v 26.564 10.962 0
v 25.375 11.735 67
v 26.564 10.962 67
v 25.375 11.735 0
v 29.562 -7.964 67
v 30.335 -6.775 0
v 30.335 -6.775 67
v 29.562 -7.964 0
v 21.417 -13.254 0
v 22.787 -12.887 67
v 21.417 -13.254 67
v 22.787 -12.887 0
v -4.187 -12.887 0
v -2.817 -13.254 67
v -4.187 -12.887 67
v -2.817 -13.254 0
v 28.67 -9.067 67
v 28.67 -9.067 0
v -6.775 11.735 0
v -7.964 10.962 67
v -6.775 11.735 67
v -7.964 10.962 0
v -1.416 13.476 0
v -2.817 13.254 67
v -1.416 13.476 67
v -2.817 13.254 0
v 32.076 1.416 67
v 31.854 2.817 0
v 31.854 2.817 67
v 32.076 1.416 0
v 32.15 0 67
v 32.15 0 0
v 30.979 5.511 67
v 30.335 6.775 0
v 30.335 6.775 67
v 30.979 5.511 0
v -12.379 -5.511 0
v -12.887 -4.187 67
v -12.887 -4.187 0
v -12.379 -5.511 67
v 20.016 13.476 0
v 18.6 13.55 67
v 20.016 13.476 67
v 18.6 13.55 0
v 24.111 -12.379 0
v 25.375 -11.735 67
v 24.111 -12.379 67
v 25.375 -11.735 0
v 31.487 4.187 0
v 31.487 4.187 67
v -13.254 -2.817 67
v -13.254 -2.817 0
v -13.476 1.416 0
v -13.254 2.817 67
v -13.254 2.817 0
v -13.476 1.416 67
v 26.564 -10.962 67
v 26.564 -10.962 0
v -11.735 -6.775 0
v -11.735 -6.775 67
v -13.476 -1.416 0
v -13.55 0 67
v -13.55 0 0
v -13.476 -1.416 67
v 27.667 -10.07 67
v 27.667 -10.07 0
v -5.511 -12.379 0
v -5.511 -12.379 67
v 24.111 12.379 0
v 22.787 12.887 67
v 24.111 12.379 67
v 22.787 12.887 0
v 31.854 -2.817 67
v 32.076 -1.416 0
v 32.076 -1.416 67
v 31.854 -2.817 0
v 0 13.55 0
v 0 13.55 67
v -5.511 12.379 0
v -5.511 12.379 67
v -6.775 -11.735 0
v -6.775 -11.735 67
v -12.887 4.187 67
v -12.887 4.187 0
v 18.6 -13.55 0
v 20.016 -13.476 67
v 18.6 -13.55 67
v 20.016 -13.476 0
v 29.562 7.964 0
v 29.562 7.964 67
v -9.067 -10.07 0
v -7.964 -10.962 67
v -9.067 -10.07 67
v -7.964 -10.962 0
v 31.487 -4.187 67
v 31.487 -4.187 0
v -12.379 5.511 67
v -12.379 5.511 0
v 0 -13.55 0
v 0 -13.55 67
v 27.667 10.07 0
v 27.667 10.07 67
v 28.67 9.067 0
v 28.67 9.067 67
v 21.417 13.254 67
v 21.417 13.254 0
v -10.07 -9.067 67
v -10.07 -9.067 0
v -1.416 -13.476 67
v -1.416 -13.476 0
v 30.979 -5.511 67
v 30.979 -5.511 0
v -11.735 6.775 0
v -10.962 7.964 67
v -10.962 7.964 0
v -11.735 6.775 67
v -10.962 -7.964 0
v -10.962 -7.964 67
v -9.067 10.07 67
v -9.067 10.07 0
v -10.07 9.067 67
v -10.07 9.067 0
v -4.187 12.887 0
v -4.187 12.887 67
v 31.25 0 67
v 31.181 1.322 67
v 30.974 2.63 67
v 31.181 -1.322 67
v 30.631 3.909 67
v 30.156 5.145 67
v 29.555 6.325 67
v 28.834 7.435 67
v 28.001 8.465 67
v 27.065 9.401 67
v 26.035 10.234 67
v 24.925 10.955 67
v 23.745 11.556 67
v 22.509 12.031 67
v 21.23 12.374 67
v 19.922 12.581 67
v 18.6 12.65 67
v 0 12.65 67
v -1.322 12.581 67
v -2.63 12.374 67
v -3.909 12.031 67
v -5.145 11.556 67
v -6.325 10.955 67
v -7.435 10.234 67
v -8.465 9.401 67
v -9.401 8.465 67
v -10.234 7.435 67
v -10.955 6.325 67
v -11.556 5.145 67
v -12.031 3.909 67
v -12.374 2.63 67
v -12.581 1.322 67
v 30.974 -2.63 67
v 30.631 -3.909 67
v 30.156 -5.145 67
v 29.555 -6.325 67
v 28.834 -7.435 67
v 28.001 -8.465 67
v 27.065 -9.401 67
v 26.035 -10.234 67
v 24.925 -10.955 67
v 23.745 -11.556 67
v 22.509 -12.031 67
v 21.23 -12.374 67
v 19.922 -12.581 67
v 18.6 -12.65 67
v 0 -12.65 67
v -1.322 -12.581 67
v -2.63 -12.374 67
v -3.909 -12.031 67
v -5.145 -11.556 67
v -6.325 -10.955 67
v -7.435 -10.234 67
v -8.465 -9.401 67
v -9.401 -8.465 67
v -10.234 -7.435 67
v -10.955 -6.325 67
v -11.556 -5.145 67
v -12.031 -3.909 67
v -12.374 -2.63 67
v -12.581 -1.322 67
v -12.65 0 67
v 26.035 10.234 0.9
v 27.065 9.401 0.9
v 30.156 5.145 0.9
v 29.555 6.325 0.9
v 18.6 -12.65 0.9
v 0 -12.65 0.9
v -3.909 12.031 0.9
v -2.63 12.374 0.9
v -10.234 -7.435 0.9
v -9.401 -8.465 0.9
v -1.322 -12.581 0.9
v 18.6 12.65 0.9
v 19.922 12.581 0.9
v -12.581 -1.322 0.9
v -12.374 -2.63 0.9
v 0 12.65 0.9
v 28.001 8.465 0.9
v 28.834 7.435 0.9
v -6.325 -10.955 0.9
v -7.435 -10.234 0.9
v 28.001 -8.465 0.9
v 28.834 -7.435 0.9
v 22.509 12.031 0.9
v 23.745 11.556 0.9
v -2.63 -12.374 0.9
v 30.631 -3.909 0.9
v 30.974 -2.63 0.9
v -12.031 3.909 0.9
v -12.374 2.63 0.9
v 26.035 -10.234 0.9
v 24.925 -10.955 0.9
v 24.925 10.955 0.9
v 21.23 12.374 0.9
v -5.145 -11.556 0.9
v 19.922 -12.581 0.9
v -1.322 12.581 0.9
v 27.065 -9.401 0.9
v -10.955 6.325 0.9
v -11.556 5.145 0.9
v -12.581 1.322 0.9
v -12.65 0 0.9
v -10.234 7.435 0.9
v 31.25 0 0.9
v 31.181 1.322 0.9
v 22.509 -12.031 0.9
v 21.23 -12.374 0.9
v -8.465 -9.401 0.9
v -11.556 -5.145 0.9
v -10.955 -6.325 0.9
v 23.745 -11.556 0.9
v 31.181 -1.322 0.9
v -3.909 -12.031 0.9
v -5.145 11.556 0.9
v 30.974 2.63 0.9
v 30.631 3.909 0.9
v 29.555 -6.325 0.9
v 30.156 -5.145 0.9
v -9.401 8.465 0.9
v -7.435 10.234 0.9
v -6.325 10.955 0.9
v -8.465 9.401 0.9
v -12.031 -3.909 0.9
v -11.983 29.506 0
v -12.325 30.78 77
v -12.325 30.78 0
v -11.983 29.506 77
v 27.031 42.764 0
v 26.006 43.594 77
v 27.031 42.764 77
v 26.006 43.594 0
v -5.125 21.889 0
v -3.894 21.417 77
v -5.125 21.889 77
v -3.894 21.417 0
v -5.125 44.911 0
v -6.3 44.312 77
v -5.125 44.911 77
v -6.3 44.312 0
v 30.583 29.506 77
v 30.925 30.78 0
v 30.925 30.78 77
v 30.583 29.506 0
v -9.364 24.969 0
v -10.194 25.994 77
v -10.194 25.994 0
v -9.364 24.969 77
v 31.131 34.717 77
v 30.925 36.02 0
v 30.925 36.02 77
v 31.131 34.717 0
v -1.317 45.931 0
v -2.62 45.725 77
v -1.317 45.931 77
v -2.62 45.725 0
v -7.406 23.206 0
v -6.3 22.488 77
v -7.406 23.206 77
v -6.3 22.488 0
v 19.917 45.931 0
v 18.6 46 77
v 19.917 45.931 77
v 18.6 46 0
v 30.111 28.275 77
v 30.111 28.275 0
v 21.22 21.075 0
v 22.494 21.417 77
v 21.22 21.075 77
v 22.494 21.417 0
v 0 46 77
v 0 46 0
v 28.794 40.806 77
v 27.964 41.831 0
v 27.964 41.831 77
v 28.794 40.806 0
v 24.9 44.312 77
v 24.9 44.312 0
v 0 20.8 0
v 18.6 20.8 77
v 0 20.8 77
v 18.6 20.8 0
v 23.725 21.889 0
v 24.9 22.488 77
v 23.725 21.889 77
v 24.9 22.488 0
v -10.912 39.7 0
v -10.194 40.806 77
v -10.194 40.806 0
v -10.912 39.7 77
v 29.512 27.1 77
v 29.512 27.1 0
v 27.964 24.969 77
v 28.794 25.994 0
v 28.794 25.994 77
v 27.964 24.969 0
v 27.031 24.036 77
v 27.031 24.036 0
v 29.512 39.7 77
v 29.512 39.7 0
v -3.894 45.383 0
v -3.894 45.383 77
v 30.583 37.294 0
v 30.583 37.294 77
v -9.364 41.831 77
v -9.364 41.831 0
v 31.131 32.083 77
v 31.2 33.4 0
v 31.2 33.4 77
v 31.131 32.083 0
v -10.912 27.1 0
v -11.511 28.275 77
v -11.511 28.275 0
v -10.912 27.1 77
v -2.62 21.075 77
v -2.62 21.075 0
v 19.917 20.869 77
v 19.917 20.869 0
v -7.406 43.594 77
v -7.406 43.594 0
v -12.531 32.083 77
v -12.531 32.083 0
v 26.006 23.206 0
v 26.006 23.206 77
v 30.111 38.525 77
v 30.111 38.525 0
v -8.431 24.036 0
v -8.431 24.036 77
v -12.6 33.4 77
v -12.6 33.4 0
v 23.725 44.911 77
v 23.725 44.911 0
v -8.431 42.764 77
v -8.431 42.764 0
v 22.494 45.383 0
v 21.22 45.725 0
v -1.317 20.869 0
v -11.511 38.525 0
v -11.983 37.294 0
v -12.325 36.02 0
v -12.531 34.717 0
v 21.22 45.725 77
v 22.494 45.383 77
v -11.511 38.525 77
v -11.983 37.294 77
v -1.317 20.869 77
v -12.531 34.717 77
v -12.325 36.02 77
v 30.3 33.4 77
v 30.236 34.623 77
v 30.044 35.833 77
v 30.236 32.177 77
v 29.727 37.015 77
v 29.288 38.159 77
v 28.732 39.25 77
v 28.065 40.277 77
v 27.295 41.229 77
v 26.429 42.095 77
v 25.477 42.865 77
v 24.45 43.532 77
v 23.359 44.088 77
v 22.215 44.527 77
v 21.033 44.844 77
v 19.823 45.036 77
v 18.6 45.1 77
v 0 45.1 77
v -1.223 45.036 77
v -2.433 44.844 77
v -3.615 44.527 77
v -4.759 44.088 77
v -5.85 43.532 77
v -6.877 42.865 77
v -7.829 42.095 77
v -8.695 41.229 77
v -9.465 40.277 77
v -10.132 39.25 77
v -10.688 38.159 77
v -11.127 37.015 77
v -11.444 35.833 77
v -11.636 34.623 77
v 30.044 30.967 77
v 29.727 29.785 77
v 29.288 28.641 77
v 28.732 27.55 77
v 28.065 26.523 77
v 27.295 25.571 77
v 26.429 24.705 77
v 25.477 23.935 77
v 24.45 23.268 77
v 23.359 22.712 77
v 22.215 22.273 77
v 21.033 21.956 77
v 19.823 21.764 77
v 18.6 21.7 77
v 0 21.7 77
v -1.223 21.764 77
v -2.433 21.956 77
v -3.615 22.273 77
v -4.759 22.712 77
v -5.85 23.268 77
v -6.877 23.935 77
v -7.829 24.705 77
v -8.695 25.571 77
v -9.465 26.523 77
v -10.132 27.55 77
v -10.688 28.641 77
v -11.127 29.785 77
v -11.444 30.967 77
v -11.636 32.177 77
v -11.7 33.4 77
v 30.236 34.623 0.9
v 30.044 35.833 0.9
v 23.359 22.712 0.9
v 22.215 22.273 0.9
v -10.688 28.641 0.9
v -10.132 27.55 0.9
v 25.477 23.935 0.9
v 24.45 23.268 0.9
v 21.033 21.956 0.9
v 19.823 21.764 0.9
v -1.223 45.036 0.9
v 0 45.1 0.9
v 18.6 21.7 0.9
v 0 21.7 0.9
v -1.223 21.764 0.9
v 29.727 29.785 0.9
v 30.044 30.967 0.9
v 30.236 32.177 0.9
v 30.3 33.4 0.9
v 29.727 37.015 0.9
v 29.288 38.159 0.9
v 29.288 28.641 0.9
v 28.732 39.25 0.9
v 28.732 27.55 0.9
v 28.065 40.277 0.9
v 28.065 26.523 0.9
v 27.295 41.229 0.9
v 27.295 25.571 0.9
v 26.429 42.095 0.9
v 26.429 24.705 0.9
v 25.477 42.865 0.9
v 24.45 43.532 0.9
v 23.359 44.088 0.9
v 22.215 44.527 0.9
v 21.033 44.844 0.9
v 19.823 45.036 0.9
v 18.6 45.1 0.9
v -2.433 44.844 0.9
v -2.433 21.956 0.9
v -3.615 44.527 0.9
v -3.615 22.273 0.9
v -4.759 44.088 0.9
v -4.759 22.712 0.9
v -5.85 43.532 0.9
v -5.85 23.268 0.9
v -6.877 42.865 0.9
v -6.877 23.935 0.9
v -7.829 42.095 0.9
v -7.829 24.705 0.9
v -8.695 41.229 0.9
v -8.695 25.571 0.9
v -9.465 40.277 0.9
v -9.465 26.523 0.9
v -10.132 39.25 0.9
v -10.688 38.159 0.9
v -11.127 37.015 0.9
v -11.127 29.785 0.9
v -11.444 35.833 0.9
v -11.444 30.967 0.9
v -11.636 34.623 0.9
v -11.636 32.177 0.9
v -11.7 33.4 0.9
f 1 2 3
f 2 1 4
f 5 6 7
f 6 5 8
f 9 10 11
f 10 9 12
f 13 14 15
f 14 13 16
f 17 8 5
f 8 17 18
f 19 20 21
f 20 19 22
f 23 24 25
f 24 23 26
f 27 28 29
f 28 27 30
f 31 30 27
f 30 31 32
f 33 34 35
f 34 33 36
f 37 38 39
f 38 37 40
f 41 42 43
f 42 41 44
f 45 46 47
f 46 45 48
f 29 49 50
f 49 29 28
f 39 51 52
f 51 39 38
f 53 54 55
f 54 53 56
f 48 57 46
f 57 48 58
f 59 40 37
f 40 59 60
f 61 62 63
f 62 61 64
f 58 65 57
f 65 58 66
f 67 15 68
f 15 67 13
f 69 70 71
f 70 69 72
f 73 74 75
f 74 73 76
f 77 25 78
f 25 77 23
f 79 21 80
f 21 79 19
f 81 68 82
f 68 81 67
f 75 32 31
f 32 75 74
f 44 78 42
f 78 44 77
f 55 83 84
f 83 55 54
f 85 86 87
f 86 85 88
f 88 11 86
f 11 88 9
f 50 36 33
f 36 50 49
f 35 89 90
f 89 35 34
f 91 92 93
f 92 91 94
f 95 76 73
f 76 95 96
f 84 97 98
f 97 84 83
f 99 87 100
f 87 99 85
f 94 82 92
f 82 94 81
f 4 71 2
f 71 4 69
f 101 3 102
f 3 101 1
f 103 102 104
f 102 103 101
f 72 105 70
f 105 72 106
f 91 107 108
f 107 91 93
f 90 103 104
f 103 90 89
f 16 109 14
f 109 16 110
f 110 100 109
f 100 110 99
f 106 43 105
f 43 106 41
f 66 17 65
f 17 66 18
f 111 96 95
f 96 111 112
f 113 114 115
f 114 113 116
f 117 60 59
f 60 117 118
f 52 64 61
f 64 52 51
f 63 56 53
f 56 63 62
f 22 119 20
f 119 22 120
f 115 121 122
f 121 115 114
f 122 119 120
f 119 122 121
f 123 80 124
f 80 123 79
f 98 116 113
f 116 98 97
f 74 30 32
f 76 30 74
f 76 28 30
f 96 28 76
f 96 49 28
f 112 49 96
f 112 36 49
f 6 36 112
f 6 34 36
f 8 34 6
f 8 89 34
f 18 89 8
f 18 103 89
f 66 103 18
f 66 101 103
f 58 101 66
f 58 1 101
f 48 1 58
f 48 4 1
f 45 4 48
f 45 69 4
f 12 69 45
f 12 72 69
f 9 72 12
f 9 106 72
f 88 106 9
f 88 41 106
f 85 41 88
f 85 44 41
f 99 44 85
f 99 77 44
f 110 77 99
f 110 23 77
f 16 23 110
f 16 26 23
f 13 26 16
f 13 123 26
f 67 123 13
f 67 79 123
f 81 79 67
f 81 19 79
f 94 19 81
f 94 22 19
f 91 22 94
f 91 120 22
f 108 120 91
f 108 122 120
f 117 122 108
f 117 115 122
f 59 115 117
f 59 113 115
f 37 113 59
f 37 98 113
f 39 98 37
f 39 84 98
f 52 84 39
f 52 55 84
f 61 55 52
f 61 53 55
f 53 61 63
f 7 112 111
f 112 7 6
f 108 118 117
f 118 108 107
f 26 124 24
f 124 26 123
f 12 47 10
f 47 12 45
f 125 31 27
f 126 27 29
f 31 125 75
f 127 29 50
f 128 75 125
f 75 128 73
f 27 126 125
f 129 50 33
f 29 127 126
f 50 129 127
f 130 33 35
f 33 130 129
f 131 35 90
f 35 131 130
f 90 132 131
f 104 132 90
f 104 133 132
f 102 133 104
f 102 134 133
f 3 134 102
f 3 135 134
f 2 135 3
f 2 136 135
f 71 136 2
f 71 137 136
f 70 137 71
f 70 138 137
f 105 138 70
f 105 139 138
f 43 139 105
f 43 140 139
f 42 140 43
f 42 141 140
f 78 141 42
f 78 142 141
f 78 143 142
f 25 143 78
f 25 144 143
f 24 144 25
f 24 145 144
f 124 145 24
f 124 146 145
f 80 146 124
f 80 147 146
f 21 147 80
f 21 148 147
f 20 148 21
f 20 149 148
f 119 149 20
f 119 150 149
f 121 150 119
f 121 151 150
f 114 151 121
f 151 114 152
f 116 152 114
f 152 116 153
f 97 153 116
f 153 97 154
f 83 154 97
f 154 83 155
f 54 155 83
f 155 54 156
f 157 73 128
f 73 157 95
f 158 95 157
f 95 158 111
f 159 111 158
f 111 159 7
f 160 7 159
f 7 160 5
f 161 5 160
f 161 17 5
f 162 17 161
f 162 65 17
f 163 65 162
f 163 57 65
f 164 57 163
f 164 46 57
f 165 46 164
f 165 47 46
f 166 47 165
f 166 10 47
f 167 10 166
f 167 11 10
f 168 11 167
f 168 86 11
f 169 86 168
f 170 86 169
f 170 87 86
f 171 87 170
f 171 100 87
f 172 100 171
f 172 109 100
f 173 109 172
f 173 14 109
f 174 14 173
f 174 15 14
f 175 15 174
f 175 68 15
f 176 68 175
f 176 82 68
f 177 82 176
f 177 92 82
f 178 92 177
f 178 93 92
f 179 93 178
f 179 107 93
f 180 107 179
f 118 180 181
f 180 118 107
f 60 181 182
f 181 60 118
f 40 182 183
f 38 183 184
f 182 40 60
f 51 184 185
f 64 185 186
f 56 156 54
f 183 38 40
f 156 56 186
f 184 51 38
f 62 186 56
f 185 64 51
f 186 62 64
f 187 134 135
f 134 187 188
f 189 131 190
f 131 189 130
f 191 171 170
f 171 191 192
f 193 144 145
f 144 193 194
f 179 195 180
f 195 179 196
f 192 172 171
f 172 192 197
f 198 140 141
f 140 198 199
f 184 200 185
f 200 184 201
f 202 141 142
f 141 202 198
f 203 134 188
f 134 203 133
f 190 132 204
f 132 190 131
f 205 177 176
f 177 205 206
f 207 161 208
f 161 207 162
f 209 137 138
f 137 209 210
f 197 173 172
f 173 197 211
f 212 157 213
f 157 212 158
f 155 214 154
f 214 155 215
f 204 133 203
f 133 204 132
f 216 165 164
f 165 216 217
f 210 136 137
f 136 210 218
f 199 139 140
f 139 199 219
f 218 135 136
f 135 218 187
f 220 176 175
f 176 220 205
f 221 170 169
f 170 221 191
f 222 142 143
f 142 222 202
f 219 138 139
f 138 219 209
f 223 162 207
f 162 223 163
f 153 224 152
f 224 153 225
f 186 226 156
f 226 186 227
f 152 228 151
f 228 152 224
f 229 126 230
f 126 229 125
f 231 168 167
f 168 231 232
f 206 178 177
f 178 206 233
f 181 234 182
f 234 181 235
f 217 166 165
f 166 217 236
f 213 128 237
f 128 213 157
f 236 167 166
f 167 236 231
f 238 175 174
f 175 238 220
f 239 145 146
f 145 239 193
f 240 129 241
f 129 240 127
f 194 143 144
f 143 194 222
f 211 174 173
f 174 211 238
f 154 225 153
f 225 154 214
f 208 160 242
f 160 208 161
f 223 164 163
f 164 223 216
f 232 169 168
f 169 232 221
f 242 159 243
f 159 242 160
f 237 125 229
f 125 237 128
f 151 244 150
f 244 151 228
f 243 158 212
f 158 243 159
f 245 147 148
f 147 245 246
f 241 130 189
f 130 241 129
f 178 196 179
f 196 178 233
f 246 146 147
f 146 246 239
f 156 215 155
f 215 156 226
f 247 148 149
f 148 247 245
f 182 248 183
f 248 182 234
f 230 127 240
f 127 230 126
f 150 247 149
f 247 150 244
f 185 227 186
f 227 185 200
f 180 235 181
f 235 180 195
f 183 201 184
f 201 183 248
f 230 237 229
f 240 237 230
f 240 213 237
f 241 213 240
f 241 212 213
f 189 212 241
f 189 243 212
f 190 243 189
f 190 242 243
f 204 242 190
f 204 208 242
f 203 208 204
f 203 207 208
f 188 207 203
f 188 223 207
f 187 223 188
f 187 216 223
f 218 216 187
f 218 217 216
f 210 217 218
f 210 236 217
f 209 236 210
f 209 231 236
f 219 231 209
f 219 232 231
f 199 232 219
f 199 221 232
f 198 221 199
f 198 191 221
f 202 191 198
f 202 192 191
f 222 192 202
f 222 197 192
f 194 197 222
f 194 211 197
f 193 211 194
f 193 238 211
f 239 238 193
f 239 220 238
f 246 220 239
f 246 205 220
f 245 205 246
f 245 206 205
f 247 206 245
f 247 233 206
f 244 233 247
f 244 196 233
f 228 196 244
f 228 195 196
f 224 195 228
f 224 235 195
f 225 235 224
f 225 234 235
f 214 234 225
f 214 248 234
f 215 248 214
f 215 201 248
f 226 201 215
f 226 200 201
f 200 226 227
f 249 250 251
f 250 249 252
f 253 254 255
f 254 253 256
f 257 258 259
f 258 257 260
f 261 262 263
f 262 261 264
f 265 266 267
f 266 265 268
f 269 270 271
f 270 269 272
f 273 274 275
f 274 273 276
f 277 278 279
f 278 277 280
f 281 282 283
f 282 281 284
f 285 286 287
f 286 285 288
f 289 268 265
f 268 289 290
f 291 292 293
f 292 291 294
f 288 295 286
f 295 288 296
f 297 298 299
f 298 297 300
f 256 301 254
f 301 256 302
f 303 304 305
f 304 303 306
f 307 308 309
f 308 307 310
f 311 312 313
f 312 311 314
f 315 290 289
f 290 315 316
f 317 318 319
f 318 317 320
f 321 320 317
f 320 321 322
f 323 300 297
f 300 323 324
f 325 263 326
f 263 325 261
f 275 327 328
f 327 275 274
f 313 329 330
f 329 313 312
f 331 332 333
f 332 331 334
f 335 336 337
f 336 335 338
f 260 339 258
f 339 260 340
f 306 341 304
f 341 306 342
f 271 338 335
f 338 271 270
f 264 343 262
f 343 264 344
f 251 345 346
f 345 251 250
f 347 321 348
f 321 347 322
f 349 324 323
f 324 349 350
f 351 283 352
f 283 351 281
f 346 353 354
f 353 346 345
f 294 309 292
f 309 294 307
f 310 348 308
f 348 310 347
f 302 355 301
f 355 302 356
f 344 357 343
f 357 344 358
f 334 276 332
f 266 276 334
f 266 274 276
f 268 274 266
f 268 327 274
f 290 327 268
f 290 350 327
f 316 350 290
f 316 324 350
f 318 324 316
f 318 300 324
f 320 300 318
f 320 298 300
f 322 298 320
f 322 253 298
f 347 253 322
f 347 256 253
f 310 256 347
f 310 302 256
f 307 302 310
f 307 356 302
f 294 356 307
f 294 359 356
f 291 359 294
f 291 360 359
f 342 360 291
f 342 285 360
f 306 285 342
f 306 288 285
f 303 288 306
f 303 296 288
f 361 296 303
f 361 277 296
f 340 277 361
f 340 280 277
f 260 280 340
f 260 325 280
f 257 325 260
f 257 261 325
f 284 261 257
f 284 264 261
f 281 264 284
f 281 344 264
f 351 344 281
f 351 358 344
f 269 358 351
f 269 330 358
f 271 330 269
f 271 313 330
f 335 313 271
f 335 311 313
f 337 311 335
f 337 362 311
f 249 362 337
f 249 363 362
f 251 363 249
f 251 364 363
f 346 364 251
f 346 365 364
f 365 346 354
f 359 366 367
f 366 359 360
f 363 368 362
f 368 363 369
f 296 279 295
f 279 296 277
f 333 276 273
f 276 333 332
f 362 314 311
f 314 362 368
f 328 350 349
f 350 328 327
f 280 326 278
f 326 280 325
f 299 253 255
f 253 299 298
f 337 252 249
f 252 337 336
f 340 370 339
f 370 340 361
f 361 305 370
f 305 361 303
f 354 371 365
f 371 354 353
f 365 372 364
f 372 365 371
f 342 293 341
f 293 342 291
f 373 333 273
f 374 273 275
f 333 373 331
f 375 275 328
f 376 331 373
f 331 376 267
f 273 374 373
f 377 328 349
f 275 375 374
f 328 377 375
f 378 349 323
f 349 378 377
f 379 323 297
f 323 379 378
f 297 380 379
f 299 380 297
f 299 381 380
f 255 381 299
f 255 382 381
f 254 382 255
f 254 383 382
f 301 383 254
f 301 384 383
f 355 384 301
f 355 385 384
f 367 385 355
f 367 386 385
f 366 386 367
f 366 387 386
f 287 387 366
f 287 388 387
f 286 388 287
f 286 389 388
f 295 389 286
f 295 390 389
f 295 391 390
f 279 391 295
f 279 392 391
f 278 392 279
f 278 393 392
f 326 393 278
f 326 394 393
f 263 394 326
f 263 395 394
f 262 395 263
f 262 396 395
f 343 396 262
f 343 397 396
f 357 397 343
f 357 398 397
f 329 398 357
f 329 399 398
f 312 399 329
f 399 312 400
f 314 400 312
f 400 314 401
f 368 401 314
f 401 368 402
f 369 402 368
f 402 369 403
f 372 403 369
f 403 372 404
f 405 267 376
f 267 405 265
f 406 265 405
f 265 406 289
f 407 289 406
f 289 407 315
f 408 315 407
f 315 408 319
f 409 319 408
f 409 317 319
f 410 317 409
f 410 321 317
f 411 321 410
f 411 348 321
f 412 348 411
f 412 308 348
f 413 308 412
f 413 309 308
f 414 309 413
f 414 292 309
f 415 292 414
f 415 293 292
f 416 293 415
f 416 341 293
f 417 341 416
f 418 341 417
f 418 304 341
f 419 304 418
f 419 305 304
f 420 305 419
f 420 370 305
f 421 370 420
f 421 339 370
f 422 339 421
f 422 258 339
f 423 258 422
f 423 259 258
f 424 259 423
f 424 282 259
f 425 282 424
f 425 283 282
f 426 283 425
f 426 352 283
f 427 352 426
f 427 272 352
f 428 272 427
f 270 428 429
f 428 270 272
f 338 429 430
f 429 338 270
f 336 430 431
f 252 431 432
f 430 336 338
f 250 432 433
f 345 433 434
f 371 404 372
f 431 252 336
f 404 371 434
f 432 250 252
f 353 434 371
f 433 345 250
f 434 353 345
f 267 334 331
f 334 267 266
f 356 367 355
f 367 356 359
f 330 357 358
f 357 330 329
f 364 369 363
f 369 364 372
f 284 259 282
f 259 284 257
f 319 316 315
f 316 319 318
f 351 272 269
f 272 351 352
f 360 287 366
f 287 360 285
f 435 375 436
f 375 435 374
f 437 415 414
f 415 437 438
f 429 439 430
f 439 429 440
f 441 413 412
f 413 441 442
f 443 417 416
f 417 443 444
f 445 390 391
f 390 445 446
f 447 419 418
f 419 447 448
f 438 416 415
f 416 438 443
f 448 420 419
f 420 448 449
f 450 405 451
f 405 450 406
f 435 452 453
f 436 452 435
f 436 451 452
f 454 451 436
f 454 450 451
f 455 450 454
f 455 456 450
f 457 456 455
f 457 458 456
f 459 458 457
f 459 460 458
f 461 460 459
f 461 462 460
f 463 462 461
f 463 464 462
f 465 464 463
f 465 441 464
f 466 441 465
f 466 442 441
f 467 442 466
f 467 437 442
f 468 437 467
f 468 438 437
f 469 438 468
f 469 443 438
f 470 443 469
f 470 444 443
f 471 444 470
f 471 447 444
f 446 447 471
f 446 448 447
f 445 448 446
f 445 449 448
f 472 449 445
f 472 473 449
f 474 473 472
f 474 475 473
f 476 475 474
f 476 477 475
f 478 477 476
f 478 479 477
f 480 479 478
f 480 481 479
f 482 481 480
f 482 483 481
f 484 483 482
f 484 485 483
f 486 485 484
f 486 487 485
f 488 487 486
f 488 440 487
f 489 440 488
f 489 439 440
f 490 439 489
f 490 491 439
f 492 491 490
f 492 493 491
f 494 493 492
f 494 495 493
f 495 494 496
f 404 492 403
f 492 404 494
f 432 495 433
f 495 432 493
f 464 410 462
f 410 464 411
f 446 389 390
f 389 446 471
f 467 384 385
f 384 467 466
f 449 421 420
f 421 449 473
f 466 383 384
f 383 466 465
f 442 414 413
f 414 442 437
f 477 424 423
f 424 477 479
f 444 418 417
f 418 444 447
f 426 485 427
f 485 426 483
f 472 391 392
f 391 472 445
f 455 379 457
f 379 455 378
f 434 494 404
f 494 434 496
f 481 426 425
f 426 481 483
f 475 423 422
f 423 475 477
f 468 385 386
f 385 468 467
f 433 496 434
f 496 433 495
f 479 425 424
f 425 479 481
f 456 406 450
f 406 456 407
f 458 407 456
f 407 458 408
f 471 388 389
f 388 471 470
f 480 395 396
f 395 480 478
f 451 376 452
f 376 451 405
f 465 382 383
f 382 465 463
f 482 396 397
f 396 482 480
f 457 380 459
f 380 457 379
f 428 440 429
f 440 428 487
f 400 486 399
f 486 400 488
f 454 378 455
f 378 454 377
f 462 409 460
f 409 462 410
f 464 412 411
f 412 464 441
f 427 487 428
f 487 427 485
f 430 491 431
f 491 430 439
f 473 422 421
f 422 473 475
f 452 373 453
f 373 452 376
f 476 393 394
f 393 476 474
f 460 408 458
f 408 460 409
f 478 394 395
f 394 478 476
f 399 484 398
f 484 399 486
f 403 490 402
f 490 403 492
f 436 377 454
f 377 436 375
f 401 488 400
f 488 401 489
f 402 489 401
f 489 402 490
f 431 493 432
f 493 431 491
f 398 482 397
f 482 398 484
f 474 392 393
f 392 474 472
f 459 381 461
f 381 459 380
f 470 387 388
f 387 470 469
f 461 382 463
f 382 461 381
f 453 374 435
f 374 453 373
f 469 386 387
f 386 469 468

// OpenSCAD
$fn=60;
l=42;
h=77;
w=23.4;
wall=.45*2;
tol=.1;

difference() {
    hull() {
        cylinder(h=h-10,d=w+wall*4+tol);
        translate([l-w,0,0]) cylinder(h=h-10,d=w+wall*4+tol);
    }
    translate([0,0,wall]) hull() {
        cylinder(h=h-10,d=w+wall*2+tol);
        translate([l-w,0,0]) cylinder(h=h-10,d=w+wall*2+tol);
    }
}

difference() {
    translate([0,w+10,0]) hull() {
        cylinder(h=h,d=w+wall*2);
        translate([l-w,0,0]) cylinder(h=h,d=w+wall*2);
    }
    translate([0,w+10,wall]) hull() {
        cylinder(h=h,d=w);
        translate([l-w,0,0]) cylinder(h=h,d=w);
    }
}
